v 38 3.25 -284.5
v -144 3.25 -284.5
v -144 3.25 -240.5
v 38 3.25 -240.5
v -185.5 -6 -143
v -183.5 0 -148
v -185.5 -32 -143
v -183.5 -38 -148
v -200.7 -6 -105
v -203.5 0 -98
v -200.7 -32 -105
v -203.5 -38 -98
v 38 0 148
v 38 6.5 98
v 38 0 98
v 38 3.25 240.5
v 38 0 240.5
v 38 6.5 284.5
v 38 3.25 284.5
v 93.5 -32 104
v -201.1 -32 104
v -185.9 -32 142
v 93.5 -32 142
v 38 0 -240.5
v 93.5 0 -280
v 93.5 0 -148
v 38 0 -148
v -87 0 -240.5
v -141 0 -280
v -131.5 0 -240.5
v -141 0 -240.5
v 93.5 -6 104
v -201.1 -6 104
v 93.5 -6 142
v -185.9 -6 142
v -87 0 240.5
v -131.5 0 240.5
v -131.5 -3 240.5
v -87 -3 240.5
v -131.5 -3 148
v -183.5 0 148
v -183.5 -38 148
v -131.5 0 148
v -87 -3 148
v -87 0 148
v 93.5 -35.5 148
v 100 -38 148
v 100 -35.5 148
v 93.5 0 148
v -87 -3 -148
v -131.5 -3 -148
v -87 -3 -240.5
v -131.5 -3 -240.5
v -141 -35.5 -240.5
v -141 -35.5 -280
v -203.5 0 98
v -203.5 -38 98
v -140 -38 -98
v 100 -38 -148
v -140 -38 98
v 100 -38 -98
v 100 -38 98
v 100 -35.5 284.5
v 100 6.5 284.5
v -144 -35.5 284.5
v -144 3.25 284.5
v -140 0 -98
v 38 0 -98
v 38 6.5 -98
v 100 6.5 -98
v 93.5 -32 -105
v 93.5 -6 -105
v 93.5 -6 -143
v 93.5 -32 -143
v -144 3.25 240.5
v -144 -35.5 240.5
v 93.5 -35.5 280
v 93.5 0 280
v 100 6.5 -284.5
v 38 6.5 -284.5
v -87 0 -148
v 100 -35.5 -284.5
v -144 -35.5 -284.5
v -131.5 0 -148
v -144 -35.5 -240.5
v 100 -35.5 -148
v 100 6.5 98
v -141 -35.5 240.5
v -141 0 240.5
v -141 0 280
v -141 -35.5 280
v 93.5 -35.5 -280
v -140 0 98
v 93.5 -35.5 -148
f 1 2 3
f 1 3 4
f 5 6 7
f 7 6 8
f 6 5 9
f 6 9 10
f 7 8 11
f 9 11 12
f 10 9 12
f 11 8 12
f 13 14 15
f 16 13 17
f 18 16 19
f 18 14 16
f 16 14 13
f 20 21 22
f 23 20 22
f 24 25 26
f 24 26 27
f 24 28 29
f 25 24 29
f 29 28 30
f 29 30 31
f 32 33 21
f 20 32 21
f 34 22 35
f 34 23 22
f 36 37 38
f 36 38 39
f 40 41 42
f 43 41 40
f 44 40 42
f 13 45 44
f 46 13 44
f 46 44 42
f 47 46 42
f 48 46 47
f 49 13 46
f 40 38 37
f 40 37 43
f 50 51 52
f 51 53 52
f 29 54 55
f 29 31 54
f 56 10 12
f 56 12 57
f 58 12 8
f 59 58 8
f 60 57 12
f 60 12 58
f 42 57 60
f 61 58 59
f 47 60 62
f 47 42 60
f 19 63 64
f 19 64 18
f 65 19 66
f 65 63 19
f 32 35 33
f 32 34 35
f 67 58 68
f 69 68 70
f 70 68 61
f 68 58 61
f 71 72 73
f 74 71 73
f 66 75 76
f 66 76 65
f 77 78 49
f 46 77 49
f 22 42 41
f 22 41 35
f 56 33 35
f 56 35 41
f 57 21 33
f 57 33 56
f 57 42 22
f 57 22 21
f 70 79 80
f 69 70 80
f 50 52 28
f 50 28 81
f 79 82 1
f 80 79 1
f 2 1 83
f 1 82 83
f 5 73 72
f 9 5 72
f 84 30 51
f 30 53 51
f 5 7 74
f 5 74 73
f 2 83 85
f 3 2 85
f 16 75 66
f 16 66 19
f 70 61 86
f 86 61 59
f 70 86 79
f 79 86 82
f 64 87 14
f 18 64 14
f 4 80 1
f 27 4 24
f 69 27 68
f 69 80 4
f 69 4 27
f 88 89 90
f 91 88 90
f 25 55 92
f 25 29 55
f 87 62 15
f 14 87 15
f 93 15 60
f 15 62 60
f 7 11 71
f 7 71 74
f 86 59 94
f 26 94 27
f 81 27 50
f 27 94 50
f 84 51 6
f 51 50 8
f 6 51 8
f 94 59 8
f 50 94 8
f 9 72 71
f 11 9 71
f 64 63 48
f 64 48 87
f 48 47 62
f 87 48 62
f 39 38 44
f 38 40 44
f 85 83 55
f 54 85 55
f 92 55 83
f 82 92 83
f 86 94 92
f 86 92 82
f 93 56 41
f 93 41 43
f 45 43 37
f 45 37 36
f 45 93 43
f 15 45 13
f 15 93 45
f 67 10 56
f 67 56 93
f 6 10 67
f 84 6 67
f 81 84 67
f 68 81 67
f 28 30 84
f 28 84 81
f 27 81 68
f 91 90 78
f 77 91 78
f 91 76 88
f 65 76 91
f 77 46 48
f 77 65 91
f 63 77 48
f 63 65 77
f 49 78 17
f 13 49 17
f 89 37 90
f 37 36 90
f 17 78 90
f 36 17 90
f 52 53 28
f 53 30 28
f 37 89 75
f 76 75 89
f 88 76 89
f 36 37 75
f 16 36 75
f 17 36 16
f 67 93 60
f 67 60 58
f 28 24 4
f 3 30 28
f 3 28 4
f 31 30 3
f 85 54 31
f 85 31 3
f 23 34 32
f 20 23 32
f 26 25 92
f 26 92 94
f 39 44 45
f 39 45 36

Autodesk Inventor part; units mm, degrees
ref_plane "YZ Plane" through (0, 0, 0) normal (1, 0, 0) x (0, 1, 0)
ref_plane "XZ Plane" through (0, 0, 0) normal (0, 1, 0) x (-1, 0, 0)
ref_plane "XY Plane" through (0, 0, 0) normal (0, 0, 1) x (1, 0, 0)
sketch "Sketch1" plane through (0, 0, 0) normal (0, 1, 0) x (-1, 0, 0)
  line L0 (-100, 284.5) -> (-100, 98)
  line L1 (-100, 98) -> (140, 98)
  line L2 (140, 98) -> (140, -98)
  line L3 (140, -98) -> (-100, -98)
  line L4 (-100, -98) -> (-100, -284.5)
  line L5 (-100, 284.5) -> (144, 284.5)
  line L6 (144, 284.5) -> (144, 240.5)
  line L7 (144, 240.5) -> (131.5, 240.5)
  line L8 (131.5, 240.5) -> (131.5, 148)
  line L9 (131.5, 148) -> (183.5, 148)
  line L10 (183.5, 148) -> (203.5, 98)
  line L11 (-100, -284.5) -> (144, -284.5)
  line L12 (144, -284.5) -> (144, -240.5)
  line L13 (144, -240.5) -> (131.5, -240.5)
  line L14 (131.5, -240.5) -> (131.5, -148)
  line L15 (131.5, -148) -> (183.5, -148)
  line L16 (183.5, -148) -> (203.5, -98)
  line L17 (203.5, 98) -> (203.5, -98)
  line L18 (-38, 240.5) -> (-38, 148)
  line L19 (-38, 148) -> (87, 148)
  line L20 (87, 148) -> (87, 240.5)
  line L21 (87, 240.5) -> (-38, 240.5)
  line L22 (-38, -148) -> (-38, -240.5)
  line L23 (-38, -240.5) -> (87, -240.5)
  line L24 (87, -240.5) -> (87, -148)
  line L25 (87, -148) -> (-38, -148)
  point P0 (0, 0)
  point P1 (140, 0)
  dimension "d4" = 196
  dimension "d8" = 244
  dimension "d9" = 44
  dimension "d10" = 12.5
  dimension "d12" = 52
  dimension "d13" = 50
  dimension "d14" = 20
  dimension "d17" = 12.5
  dimension "d19" = 52
  dimension "d20" = 50
  dimension "d21" = 20
  dimension "d23" = 92.5
  dimension "d24" = 125
  dimension "d25" = 62
  dimension "d26" = 44
  dimension "d27" = 92.5
  dimension "d28" = 125
  dimension "d29" = 62
  dimension "d30" = 44
  dimension "d64" = 240
  dimension "d65" = 240
  dimension "d66" = 50
  dimension "d69" = 92.5
  dimension "d70" = 196
  dimension "d76" = 44
extrude "Extrusion1" add sketch "Sketch1" along normal blind 6.5
sketch "Sketch3" plane through (0, 0, 0) normal (0, -1, 0) x (1, 0, 0)
  line L0 (-87, -148) -> (38, -148) construction
  line L1 (38, -148) -> (38, -240.5) construction
  line L2 (38, -240.5) -> (-87, -240.5) construction
  line L3 (-87, -240.5) -> (-87, -148) construction
  line L4 (-87, 240.5) -> (38, 240.5) construction
  line L5 (38, 240.5) -> (38, 148) construction
  line L6 (38, 148) -> (-87, 148) construction
  line L7 (-87, 148) -> (-87, 240.5) construction
  line L8 (100, 284.5) -> (100, 98) construction
  line L9 (-144, 284.5) -> (100, 284.5) construction
  line L10 (-144, 240.5) -> (-144, 284.5) construction
  line L11 (-131.5, 240.5) -> (-144, 240.5) construction
  line L12 (-131.5, 148) -> (-131.5, 240.5) construction
  line L13 (-183.5, 148) -> (-131.5, 148) construction
  line L14 (-203.5, 98) -> (-183.5, 148) construction
  line L15 (-203.5, -98) -> (-203.5, 98) construction
  line L16 (-183.5, -148) -> (-203.5, -98) construction
  line L17 (-131.5, -148) -> (-183.5, -148) construction
  line L18 (-131.5, -240.5) -> (-131.5, -148) construction
  line L19 (-144, -240.5) -> (-131.5, -240.5) construction
  line L20 (-144, -284.5) -> (-144, -240.5) construction
  line L21 (100, -284.5) -> (-144, -284.5) construction
  line L22 (100, -98) -> (100, -284.5) construction
  line L23 (-140, -98) -> (100, -98) construction
  line L24 (-140, 98) -> (-140, -98) construction
  line L25 (100, 98) -> (-140, 98) construction
  line L26 (100, -98) -> (100, -284.5) projected
  line L27 (-131.5, -148) -> (-183.5, -148) projected
  line L28 (100, -98) -> (-203.5, -98)
  line L29 (-140, -98) -> (100, -98) projected
  line L30 (-183.5, -148) -> (-203.5, -98) projected
  line L31 (-183.5, -148) -> (100, -148)
  line L32 (100, -98) -> (100, -284.5) projected
  line L33 (100, -98) -> (100, -148)
  line L34 (100, 284.5) -> (100, 98) projected
  line L35 (-203.5, -98) -> (-203.5, 98) projected
  line L36 (100, 98) -> (-203.5, 98)
  line L37 (-203.5, 98) -> (-183.5, 148)
  line L38 (100, 148) -> (100, 98)
  line L39 (-183.5, 148) -> (-131.5, 148) projected
  line L40 (100, 148) -> (-183.5, 148)
  line L41 (-183.5, -148) -> (-203.5, -98)
  line L42 (-203.5, -98) -> (-183.5, -148)
  point P0 (0, 0)
extrude "Extrusion3" add sketch "Sketch3" along normal blind 38
sketch "Sketch4" plane through (0, 0, 0) normal (0, -1, 0) x (1, 0, 0)
  line L0 (-203.5, -98) -> (-203.5, 98) projected
  line L1 (-140, 98) -> (-203.5, 98) projected
  line L2 (-203.5, 98) -> (-140, 98)
  line L3 (-140, 98) -> (-140, -98) projected
  line L4 (-140, 98) -> (-140, -98)
  line L5 (-140, -98) -> (-203.5, -98)
  line L6 (-203.5, -98) -> (-203.5, 98)
  point P0 (0, 0)
extrude "Extrusion4" add sketch "Sketch4" along normal blind 38
sketch "Sketch5" plane through (0, 6.5, 0) normal (0, 1, 0) x (1, 0, 0)
  line L0 (38, 148) -> (-87, 148) construction
  line L1 (-87, 148) -> (-87, 240.5) construction
  line L2 (-87, 240.5) -> (38, 240.5) construction
  line L3 (38, 240.5) -> (38, 148) construction
  line L4 (38, -240.5) -> (-87, -240.5) construction
  line L5 (-87, -240.5) -> (-87, -148) construction
  line L6 (-87, -148) -> (38, -148) construction
  line L7 (38, -148) -> (38, -240.5) construction
  line L8 (100, -284.5) -> (100, -98) construction
  line L9 (100, -98) -> (-140, -98) construction
  line L10 (-140, -98) -> (-140, 98) construction
  line L11 (-140, 98) -> (100, 98) construction
  line L12 (100, 98) -> (100, 284.5) construction
  line L13 (100, 284.5) -> (-144, 284.5) construction
  line L14 (-144, 284.5) -> (-144, 240.5) construction
  line L15 (-144, 240.5) -> (-131.5, 240.5) construction
  line L16 (-131.5, 240.5) -> (-131.5, 148) construction
  line L17 (-131.5, 148) -> (-183.5, 148) construction
  line L18 (-183.5, 148) -> (-203.5, 98) construction
  line L19 (-203.5, 98) -> (-203.5, -98) construction
  line L20 (-203.5, -98) -> (-183.5, -148) construction
  line L21 (-183.5, -148) -> (-131.5, -148) construction
  line L22 (-131.5, -148) -> (-131.5, -240.5) construction
  line L23 (-131.5, -240.5) -> (-144, -240.5) construction
  line L24 (-144, -240.5) -> (-144, -284.5) construction
  line L25 (-144, -284.5) -> (100, -284.5) construction
  line L26 (-140, -98) -> (-140, 98) projected
  line L27 (-140, -98) -> (-140, 98)
  line L28 (-140, 98) -> (100, 98) projected
  line L29 (-140, 98) -> (38, 98)
  line L30 (38, 240.5) -> (38, 148) projected
  line L31 (38, 98) -> (38, 148)
  line L32 (-87, 240.5) -> (-87, 148) projected
  line L33 (-87, 148) -> (-87, 240.5)
  line L34 (-131.5, 240.5) -> (-131.5, 148) projected
  line L35 (-131.5, 148) -> (-131.5, 240.5)
  line L36 (38, 148) -> (-87, 148) projected
  line L37 (38, 148) -> (-87, 148)
  line L38 (-131.5, 148) -> (-183.5, 148) projected
  line L39 (-131.5, 148) -> (-183.5, 148)
  line L40 (-183.5, 148) -> (-203.5, 98)
  line L41 (-203.5, 98) -> (-203.5, -98) projected
  line L42 (-203.5, 98) -> (-203.5, -98)
  line L43 (100, -148) -> (-183.5, -148) projected
  line L44 (-203.5, -98) -> (-183.5, -148)
  line L45 (-183.5, -148) -> (-131.5, -148)
  line L46 (-131.5, -148) -> (-131.5, -240.5) projected
  line L47 (-131.5, -148) -> (-131.5, -240.5)
  line L48 (-87, -240.5) -> (-87, -148) projected
  line L49 (-87, -240.5) -> (-87, -148)
  line L50 (-87, -148) -> (38, -148)
  line L51 (-140, -98) -> (100, -98) projected
  line L52 (38, -98) -> (38, -148)
  line L53 (38, -98) -> (-140, -98)
  line L54 (38, -148) -> (38, -240.5) projected
  line L55 (38, -240.5) -> (38, -284.5)
  line L56 (-144, -284.5) -> (100, -284.5) projected
  line L57 (-144, -240.5) -> (-144, -284.5) projected
  line L58 (-144, -284.5) -> (-144, -240.5)
  line L59 (-144, -240.5) -> (-131.5, -240.5)
  line L60 (38, -240.5) -> (-87, -240.5) projected
  line L61 (-87, -240.5) -> (38, -240.5)
  line L62 (38, -284.5) -> (-144, -284.5)
  line L63 (38, 240.5) -> (-87, 240.5) projected
  line L64 (-87, 240.5) -> (38, 240.5)
  line L65 (38, 240.5) -> (38, 284.5)
  line L66 (100, 284.5) -> (-144, 284.5) projected
  line L67 (-144, 284.5) -> (38, 284.5)
  line L68 (-144, 284.5) -> (-144, 240.5) projected
  line L69 (-144, 284.5) -> (-144, 240.5)
  line L70 (-144, 240.5) -> (-131.5, 240.5)
  point P0 (0, 0)
extrude "Extrusion5" cut sketch "Sketch5" against normal blind 3.25 contours L51 L52 L43 L44 L41 L40 L38 L34 L70 L68 L66 L65 L63 L32 L36 L31 L28 L26 | L48 L60 L55 L56 L57 L59 L46 L43
sketch "Sketch6" plane through (0, 3.25, 0) normal (0, 1, 0) x (1, 0, 0)
  line L0 (-87, 148) -> (38, 148) construction
  line L1 (-87, 240.5) -> (-87, 148) construction
  line L2 (38, 240.5) -> (-87, 240.5) construction
  line L3 (38, 284.5) -> (38, 240.5) construction
  line L4 (-144, 284.5) -> (38, 284.5) construction
  line L5 (-144, 240.5) -> (-144, 284.5) construction
  line L6 (-131.5, 240.5) -> (-144, 240.5) construction
  line L7 (-131.5, 148) -> (-131.5, 240.5) construction
  line L8 (-183.5, 148) -> (-131.5, 148) construction
  line L9 (-203.5, 98) -> (-183.5, 148) construction
  line L10 (-203.5, -98) -> (-203.5, 98) construction
  line L11 (-183.5, -148) -> (-203.5, -98) construction
  line L12 (-131.5, -148) -> (-183.5, -148) construction
  line L13 (-131.5, -240.5) -> (-131.5, -148) construction
  line L14 (-144, -240.5) -> (-131.5, -240.5) construction
  line L15 (-144, -284.5) -> (-144, -240.5) construction
  line L16 (38, -284.5) -> (-144, -284.5) construction
  line L17 (38, -240.5) -> (38, -284.5) construction
  line L18 (-87, -240.5) -> (38, -240.5) construction
  line L19 (-87, -148) -> (-87, -240.5) construction
  line L20 (38, -148) -> (-87, -148) construction
  line L21 (38, -98) -> (38, -148) construction
  line L22 (-140, -98) -> (38, -98) construction
  line L23 (-140, 98) -> (-140, -98) construction
  line L24 (38, 98) -> (-140, 98) construction
  line L25 (38, 148) -> (38, 98) construction
  line L26 (38, -149) -> (-87, -149) projected
  line L27 (38, -148) -> (-87, -148)
  line L28 (-87, -148) -> (-87, -240.5)
  line L29 (-131.5, -240.5) -> (-87, -240.5)
  line L30 (-131.5, -148) -> (-131.5, -240.5) projected
  line L31 (-131.5, -240.5) -> (-131.5, -148)
  line L32 (100, -148) -> (-183.5, -148) projected
  line L33 (-131.5, -148) -> (-183.5, -148)
  line L34 (-203.5, -98) -> (-203.5, 98) projected
  line L35 (-183.5, -148) -> (-203.5, -98)
  line L36 (-203.5, -98) -> (-203.5, 98)
  line L37 (-203.5, 98) -> (-183.5, 148)
  line L38 (-131.5, 240.5) -> (-131.5, 148) projected
  line L39 (-183.5, 148) -> (100, 148) projected
  line L40 (-131.5, 148) -> (-183.5, 148)
  line L41 (-144, 240.5) -> (-131.5, 240.5) projected
  line L42 (-131.5, 148) -> (-131.5, 240.5)
  line L43 (-131.5, 240.5) -> (-87, 240.5)
  line L44 (-87, 240.5) -> (-87, 148) projected
  line L45 (-87, 148) -> (-87, 240.5)
  line L46 (38, 148) -> (38, 240.5) projected
  line L47 (-87, 148) -> (38, 148)
  line L48 (38, 148) -> (38, 98) projected
  line L49 (38, 148) -> (38, 98)
  line L50 (100, 98) -> (-140, 98) projected
  line L51 (38, 98) -> (-140, 98)
  line L52 (-140, 98) -> (-140, -98) projected
  line L53 (-140, 98) -> (-140, -98)
  line L54 (-140, -98) -> (38, -98)
  line L55 (38, -98) -> (38, -284.5) projected
  line L56 (38, -148) -> (38, -98)
  point P0 (0, 0)
extrude "Extrusion6" add sketch "Sketch6" against normal blind 6.25 contours L28 L29 L30 L32 | L27 L32 L35 L34 L37 L39 L48 L50 L52 L54 L55 | L39 L38 L43 L44
extrude "Extrusion7" cut sketch "Sketch6" against normal blind 3.25 contours L28 L29 L30 L32 | L27 L32 L35 L34 L37 L39 L48 L50 L52 L54 L55 | L39 L38 L43 L44
sketch "Sketch7" plane through (0, 0, 0) normal (0, -1, 0) x (1, 0, 0)
  line L0 (38, 148) -> (100, 148) projected
  line L1 (93.5, 148) -> (100, 148)
  line L2 (100, 284.5) -> (100, 148) projected
  line L3 (100, 285) -> (100, 148)
  line L4 (-144, 284.5) -> (100, 284.5) projected
  line L5 (-144, 240.5) -> (-144, 284.5) projected
  line L6 (100, 284.5) -> (-144, 284.5)
  line L7 (-144, 240.5) -> (-144, 284.5)
  line L8 (93.5, 280) -> (93.5, 148)
  line L9 (-144, 240.5) -> (38, 240.5) projected
  line L10 (-141, 240.5) -> (-141, 280)
  line L11 (-141, 280) -> (93.5, 280)
  line L12 (-141, 240.5) -> (-144, 240.5)
  line L13 (-573.3935, 0) -> (506.825, 0) construction
  line L14 (93.5, -148) -> (100, -148)
  line L15 (100, -284.5) -> (100, -148)
  line L16 (-144, -284.5) -> (100, -284.5)
  line L17 (-144, -240.5) -> (-144, -284.5)
  line L18 (100, -284.5) -> (-144, -284.5)
  line L19 (93.5, -280) -> (93.5, -148)
  line L20 (-141, -240.5) -> (-141, -280)
  line L21 (38, -240.5) -> (38, -148) construction
  line L22 (38, -240.5) -> (-144, -240.5) construction
  line L23 (-141, -240.5) -> (-144, -240.5)
  line L24 (-141, -280) -> (93.5, -280)
  line L25 (-144, -240.5) -> (-144, -284.5) projected
  line L26 (100, -98) -> (100, -284.5) projected
  line L27 (100, -148) -> (100, -284.5)
  point P0 (0, 0)
  dimension "d85" = 3
  dimension "d86" = 4.5
  dimension "d87" = 6.5
extrude "Extrusion8" add sketch "Sketch7" along normal blind 35.5
sketch "Sketch8" plane through (100, 6.5, 284.5) normal (1, 0, 0) x (0, 0, -1)
  line L0 (142.5, -38.5) -> (142.5, -12.5)
  line L1 (142.5, -12.5) -> (180.5, -12.5)
  line L2 (180.5, -38.5) -> (142.5, -38.5)
  line L3 (180.5, -12.5) -> (180.5, -38.5)
  line L4 (186.5, -44.5) -> (186.5, 0) projected
  line L5 (186.5, -44.5) -> (136.5, -44.5) projected
  line L6 (136.5, -42) -> (136.5, -44.5) projected
  line L7 (0, 0) -> (186.5, 0) projected
  line L8 (285, -82.0279) -> (285, 56.7605) construction
  line L9 (427.5, -38.5) -> (427.5, -12.5)
  line L10 (427.5, -12.5) -> (389.5, -12.5)
  line L11 (389.5, -38.5) -> (427.5, -38.5)
  line L12 (389.5, -12.5) -> (389.5, -38.5)
  point P0 (284.5, -6.5)
  point P1 (136.5, -6.5)
  dimension "d90" = 6
  dimension "d91" = 6
  dimension "d92" = 6
  dimension "d93" = 12.5
extrude "Extrusion9" cut sketch "Sketch8" against normal through all
extrude "Extrusion10" add sketch "Sketch8" against normal blind 6.5
properties part number "battlebotupperframe"
